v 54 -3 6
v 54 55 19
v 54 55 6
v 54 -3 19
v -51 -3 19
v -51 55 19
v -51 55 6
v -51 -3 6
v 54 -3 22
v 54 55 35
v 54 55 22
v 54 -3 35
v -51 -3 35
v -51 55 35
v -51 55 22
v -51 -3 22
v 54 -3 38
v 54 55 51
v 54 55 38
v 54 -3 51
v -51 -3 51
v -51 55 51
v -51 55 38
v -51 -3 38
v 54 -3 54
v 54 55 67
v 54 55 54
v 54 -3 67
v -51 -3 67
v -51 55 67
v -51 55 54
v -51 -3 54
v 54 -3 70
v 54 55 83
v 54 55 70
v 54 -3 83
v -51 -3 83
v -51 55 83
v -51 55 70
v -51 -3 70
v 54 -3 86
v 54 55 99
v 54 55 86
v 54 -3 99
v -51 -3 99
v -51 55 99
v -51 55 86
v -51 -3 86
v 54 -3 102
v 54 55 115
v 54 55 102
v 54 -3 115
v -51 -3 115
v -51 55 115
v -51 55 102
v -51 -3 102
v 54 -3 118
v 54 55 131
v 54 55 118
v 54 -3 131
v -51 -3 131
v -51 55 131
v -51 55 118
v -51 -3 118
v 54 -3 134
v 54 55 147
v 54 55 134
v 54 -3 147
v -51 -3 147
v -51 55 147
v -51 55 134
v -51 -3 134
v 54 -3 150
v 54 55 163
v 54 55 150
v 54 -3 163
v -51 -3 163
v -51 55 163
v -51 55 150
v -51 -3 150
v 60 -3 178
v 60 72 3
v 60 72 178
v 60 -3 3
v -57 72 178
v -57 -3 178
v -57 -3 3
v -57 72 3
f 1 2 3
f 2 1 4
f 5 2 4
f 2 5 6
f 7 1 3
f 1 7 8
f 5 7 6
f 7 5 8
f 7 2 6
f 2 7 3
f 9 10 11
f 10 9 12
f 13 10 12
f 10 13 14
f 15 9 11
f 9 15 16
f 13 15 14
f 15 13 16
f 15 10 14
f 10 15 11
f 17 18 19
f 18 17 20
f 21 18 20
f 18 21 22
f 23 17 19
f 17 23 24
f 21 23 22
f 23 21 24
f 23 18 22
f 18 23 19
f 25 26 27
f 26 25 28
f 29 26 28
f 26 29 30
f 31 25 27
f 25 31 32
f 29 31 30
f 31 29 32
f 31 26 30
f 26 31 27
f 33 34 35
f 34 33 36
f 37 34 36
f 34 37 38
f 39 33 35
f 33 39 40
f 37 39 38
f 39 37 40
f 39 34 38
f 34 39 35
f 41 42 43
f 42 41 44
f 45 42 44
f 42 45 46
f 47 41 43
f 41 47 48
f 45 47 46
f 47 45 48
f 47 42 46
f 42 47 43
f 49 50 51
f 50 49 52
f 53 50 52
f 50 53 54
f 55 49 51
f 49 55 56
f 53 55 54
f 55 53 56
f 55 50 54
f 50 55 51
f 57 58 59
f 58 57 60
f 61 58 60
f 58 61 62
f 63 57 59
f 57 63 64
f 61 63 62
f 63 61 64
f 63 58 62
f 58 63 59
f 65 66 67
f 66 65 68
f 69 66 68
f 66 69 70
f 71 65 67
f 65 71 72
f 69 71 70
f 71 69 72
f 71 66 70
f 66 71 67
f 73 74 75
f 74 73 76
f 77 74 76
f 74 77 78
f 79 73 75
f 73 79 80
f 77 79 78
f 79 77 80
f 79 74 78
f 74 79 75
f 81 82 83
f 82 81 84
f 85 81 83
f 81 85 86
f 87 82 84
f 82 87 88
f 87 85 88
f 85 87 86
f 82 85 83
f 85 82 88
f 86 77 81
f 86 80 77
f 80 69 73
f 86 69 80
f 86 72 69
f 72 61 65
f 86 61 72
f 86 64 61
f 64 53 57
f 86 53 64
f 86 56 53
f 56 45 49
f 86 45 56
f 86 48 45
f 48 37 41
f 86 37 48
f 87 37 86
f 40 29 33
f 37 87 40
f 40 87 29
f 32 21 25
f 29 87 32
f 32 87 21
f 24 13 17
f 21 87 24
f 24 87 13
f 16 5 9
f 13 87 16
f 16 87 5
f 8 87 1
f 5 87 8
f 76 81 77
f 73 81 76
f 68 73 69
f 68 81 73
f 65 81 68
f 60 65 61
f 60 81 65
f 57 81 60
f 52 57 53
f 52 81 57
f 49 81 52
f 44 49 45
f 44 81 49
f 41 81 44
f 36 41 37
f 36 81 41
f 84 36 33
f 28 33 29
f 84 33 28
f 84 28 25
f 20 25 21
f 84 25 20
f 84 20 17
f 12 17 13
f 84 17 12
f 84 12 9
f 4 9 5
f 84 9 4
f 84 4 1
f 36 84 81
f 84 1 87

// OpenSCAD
difference() {
    translate([-57, -3, 3]) {
        scale([117, 75, 175]) {
 
            cube();
        }
    }
   
    union (){
        translate([-51, -5, 6]) {
            scale([105, 60 , 13])
               
                cube();
        }
        translate([-51, -5, 22]) {
            scale([105, 60 , 13])
             
                cube();
        }
        translate([-51, -5, 38]) {
            scale([105, 60 , 13])
               
                cube();
        }
        
        translate([-51, -5, 54]) {
            scale([105, 60 , 13])
               
                cube();
        }
        translate([-51, -5, 70]) {
            scale([105, 60 , 13])
               
                cube();
        }        
        translate([-51, -5, 86]) {
            scale([105, 60 , 13])
           
                cube();
        }
        translate([-51, -5, 102]) {
            scale([105, 60 , 13])
      
                 cube();  
        }
        translate([-51, -5, 118]) {
            scale([105, 60 , 13])
               
                cube();
        }
        translate([-51, -5, 134]) {
            scale([105, 60 , 13])
            
                cube();
        }

        translate([-51, -5, 150]) {
            scale([105, 60 , 13])
              
                cube();
        }        
        
    }   
}
